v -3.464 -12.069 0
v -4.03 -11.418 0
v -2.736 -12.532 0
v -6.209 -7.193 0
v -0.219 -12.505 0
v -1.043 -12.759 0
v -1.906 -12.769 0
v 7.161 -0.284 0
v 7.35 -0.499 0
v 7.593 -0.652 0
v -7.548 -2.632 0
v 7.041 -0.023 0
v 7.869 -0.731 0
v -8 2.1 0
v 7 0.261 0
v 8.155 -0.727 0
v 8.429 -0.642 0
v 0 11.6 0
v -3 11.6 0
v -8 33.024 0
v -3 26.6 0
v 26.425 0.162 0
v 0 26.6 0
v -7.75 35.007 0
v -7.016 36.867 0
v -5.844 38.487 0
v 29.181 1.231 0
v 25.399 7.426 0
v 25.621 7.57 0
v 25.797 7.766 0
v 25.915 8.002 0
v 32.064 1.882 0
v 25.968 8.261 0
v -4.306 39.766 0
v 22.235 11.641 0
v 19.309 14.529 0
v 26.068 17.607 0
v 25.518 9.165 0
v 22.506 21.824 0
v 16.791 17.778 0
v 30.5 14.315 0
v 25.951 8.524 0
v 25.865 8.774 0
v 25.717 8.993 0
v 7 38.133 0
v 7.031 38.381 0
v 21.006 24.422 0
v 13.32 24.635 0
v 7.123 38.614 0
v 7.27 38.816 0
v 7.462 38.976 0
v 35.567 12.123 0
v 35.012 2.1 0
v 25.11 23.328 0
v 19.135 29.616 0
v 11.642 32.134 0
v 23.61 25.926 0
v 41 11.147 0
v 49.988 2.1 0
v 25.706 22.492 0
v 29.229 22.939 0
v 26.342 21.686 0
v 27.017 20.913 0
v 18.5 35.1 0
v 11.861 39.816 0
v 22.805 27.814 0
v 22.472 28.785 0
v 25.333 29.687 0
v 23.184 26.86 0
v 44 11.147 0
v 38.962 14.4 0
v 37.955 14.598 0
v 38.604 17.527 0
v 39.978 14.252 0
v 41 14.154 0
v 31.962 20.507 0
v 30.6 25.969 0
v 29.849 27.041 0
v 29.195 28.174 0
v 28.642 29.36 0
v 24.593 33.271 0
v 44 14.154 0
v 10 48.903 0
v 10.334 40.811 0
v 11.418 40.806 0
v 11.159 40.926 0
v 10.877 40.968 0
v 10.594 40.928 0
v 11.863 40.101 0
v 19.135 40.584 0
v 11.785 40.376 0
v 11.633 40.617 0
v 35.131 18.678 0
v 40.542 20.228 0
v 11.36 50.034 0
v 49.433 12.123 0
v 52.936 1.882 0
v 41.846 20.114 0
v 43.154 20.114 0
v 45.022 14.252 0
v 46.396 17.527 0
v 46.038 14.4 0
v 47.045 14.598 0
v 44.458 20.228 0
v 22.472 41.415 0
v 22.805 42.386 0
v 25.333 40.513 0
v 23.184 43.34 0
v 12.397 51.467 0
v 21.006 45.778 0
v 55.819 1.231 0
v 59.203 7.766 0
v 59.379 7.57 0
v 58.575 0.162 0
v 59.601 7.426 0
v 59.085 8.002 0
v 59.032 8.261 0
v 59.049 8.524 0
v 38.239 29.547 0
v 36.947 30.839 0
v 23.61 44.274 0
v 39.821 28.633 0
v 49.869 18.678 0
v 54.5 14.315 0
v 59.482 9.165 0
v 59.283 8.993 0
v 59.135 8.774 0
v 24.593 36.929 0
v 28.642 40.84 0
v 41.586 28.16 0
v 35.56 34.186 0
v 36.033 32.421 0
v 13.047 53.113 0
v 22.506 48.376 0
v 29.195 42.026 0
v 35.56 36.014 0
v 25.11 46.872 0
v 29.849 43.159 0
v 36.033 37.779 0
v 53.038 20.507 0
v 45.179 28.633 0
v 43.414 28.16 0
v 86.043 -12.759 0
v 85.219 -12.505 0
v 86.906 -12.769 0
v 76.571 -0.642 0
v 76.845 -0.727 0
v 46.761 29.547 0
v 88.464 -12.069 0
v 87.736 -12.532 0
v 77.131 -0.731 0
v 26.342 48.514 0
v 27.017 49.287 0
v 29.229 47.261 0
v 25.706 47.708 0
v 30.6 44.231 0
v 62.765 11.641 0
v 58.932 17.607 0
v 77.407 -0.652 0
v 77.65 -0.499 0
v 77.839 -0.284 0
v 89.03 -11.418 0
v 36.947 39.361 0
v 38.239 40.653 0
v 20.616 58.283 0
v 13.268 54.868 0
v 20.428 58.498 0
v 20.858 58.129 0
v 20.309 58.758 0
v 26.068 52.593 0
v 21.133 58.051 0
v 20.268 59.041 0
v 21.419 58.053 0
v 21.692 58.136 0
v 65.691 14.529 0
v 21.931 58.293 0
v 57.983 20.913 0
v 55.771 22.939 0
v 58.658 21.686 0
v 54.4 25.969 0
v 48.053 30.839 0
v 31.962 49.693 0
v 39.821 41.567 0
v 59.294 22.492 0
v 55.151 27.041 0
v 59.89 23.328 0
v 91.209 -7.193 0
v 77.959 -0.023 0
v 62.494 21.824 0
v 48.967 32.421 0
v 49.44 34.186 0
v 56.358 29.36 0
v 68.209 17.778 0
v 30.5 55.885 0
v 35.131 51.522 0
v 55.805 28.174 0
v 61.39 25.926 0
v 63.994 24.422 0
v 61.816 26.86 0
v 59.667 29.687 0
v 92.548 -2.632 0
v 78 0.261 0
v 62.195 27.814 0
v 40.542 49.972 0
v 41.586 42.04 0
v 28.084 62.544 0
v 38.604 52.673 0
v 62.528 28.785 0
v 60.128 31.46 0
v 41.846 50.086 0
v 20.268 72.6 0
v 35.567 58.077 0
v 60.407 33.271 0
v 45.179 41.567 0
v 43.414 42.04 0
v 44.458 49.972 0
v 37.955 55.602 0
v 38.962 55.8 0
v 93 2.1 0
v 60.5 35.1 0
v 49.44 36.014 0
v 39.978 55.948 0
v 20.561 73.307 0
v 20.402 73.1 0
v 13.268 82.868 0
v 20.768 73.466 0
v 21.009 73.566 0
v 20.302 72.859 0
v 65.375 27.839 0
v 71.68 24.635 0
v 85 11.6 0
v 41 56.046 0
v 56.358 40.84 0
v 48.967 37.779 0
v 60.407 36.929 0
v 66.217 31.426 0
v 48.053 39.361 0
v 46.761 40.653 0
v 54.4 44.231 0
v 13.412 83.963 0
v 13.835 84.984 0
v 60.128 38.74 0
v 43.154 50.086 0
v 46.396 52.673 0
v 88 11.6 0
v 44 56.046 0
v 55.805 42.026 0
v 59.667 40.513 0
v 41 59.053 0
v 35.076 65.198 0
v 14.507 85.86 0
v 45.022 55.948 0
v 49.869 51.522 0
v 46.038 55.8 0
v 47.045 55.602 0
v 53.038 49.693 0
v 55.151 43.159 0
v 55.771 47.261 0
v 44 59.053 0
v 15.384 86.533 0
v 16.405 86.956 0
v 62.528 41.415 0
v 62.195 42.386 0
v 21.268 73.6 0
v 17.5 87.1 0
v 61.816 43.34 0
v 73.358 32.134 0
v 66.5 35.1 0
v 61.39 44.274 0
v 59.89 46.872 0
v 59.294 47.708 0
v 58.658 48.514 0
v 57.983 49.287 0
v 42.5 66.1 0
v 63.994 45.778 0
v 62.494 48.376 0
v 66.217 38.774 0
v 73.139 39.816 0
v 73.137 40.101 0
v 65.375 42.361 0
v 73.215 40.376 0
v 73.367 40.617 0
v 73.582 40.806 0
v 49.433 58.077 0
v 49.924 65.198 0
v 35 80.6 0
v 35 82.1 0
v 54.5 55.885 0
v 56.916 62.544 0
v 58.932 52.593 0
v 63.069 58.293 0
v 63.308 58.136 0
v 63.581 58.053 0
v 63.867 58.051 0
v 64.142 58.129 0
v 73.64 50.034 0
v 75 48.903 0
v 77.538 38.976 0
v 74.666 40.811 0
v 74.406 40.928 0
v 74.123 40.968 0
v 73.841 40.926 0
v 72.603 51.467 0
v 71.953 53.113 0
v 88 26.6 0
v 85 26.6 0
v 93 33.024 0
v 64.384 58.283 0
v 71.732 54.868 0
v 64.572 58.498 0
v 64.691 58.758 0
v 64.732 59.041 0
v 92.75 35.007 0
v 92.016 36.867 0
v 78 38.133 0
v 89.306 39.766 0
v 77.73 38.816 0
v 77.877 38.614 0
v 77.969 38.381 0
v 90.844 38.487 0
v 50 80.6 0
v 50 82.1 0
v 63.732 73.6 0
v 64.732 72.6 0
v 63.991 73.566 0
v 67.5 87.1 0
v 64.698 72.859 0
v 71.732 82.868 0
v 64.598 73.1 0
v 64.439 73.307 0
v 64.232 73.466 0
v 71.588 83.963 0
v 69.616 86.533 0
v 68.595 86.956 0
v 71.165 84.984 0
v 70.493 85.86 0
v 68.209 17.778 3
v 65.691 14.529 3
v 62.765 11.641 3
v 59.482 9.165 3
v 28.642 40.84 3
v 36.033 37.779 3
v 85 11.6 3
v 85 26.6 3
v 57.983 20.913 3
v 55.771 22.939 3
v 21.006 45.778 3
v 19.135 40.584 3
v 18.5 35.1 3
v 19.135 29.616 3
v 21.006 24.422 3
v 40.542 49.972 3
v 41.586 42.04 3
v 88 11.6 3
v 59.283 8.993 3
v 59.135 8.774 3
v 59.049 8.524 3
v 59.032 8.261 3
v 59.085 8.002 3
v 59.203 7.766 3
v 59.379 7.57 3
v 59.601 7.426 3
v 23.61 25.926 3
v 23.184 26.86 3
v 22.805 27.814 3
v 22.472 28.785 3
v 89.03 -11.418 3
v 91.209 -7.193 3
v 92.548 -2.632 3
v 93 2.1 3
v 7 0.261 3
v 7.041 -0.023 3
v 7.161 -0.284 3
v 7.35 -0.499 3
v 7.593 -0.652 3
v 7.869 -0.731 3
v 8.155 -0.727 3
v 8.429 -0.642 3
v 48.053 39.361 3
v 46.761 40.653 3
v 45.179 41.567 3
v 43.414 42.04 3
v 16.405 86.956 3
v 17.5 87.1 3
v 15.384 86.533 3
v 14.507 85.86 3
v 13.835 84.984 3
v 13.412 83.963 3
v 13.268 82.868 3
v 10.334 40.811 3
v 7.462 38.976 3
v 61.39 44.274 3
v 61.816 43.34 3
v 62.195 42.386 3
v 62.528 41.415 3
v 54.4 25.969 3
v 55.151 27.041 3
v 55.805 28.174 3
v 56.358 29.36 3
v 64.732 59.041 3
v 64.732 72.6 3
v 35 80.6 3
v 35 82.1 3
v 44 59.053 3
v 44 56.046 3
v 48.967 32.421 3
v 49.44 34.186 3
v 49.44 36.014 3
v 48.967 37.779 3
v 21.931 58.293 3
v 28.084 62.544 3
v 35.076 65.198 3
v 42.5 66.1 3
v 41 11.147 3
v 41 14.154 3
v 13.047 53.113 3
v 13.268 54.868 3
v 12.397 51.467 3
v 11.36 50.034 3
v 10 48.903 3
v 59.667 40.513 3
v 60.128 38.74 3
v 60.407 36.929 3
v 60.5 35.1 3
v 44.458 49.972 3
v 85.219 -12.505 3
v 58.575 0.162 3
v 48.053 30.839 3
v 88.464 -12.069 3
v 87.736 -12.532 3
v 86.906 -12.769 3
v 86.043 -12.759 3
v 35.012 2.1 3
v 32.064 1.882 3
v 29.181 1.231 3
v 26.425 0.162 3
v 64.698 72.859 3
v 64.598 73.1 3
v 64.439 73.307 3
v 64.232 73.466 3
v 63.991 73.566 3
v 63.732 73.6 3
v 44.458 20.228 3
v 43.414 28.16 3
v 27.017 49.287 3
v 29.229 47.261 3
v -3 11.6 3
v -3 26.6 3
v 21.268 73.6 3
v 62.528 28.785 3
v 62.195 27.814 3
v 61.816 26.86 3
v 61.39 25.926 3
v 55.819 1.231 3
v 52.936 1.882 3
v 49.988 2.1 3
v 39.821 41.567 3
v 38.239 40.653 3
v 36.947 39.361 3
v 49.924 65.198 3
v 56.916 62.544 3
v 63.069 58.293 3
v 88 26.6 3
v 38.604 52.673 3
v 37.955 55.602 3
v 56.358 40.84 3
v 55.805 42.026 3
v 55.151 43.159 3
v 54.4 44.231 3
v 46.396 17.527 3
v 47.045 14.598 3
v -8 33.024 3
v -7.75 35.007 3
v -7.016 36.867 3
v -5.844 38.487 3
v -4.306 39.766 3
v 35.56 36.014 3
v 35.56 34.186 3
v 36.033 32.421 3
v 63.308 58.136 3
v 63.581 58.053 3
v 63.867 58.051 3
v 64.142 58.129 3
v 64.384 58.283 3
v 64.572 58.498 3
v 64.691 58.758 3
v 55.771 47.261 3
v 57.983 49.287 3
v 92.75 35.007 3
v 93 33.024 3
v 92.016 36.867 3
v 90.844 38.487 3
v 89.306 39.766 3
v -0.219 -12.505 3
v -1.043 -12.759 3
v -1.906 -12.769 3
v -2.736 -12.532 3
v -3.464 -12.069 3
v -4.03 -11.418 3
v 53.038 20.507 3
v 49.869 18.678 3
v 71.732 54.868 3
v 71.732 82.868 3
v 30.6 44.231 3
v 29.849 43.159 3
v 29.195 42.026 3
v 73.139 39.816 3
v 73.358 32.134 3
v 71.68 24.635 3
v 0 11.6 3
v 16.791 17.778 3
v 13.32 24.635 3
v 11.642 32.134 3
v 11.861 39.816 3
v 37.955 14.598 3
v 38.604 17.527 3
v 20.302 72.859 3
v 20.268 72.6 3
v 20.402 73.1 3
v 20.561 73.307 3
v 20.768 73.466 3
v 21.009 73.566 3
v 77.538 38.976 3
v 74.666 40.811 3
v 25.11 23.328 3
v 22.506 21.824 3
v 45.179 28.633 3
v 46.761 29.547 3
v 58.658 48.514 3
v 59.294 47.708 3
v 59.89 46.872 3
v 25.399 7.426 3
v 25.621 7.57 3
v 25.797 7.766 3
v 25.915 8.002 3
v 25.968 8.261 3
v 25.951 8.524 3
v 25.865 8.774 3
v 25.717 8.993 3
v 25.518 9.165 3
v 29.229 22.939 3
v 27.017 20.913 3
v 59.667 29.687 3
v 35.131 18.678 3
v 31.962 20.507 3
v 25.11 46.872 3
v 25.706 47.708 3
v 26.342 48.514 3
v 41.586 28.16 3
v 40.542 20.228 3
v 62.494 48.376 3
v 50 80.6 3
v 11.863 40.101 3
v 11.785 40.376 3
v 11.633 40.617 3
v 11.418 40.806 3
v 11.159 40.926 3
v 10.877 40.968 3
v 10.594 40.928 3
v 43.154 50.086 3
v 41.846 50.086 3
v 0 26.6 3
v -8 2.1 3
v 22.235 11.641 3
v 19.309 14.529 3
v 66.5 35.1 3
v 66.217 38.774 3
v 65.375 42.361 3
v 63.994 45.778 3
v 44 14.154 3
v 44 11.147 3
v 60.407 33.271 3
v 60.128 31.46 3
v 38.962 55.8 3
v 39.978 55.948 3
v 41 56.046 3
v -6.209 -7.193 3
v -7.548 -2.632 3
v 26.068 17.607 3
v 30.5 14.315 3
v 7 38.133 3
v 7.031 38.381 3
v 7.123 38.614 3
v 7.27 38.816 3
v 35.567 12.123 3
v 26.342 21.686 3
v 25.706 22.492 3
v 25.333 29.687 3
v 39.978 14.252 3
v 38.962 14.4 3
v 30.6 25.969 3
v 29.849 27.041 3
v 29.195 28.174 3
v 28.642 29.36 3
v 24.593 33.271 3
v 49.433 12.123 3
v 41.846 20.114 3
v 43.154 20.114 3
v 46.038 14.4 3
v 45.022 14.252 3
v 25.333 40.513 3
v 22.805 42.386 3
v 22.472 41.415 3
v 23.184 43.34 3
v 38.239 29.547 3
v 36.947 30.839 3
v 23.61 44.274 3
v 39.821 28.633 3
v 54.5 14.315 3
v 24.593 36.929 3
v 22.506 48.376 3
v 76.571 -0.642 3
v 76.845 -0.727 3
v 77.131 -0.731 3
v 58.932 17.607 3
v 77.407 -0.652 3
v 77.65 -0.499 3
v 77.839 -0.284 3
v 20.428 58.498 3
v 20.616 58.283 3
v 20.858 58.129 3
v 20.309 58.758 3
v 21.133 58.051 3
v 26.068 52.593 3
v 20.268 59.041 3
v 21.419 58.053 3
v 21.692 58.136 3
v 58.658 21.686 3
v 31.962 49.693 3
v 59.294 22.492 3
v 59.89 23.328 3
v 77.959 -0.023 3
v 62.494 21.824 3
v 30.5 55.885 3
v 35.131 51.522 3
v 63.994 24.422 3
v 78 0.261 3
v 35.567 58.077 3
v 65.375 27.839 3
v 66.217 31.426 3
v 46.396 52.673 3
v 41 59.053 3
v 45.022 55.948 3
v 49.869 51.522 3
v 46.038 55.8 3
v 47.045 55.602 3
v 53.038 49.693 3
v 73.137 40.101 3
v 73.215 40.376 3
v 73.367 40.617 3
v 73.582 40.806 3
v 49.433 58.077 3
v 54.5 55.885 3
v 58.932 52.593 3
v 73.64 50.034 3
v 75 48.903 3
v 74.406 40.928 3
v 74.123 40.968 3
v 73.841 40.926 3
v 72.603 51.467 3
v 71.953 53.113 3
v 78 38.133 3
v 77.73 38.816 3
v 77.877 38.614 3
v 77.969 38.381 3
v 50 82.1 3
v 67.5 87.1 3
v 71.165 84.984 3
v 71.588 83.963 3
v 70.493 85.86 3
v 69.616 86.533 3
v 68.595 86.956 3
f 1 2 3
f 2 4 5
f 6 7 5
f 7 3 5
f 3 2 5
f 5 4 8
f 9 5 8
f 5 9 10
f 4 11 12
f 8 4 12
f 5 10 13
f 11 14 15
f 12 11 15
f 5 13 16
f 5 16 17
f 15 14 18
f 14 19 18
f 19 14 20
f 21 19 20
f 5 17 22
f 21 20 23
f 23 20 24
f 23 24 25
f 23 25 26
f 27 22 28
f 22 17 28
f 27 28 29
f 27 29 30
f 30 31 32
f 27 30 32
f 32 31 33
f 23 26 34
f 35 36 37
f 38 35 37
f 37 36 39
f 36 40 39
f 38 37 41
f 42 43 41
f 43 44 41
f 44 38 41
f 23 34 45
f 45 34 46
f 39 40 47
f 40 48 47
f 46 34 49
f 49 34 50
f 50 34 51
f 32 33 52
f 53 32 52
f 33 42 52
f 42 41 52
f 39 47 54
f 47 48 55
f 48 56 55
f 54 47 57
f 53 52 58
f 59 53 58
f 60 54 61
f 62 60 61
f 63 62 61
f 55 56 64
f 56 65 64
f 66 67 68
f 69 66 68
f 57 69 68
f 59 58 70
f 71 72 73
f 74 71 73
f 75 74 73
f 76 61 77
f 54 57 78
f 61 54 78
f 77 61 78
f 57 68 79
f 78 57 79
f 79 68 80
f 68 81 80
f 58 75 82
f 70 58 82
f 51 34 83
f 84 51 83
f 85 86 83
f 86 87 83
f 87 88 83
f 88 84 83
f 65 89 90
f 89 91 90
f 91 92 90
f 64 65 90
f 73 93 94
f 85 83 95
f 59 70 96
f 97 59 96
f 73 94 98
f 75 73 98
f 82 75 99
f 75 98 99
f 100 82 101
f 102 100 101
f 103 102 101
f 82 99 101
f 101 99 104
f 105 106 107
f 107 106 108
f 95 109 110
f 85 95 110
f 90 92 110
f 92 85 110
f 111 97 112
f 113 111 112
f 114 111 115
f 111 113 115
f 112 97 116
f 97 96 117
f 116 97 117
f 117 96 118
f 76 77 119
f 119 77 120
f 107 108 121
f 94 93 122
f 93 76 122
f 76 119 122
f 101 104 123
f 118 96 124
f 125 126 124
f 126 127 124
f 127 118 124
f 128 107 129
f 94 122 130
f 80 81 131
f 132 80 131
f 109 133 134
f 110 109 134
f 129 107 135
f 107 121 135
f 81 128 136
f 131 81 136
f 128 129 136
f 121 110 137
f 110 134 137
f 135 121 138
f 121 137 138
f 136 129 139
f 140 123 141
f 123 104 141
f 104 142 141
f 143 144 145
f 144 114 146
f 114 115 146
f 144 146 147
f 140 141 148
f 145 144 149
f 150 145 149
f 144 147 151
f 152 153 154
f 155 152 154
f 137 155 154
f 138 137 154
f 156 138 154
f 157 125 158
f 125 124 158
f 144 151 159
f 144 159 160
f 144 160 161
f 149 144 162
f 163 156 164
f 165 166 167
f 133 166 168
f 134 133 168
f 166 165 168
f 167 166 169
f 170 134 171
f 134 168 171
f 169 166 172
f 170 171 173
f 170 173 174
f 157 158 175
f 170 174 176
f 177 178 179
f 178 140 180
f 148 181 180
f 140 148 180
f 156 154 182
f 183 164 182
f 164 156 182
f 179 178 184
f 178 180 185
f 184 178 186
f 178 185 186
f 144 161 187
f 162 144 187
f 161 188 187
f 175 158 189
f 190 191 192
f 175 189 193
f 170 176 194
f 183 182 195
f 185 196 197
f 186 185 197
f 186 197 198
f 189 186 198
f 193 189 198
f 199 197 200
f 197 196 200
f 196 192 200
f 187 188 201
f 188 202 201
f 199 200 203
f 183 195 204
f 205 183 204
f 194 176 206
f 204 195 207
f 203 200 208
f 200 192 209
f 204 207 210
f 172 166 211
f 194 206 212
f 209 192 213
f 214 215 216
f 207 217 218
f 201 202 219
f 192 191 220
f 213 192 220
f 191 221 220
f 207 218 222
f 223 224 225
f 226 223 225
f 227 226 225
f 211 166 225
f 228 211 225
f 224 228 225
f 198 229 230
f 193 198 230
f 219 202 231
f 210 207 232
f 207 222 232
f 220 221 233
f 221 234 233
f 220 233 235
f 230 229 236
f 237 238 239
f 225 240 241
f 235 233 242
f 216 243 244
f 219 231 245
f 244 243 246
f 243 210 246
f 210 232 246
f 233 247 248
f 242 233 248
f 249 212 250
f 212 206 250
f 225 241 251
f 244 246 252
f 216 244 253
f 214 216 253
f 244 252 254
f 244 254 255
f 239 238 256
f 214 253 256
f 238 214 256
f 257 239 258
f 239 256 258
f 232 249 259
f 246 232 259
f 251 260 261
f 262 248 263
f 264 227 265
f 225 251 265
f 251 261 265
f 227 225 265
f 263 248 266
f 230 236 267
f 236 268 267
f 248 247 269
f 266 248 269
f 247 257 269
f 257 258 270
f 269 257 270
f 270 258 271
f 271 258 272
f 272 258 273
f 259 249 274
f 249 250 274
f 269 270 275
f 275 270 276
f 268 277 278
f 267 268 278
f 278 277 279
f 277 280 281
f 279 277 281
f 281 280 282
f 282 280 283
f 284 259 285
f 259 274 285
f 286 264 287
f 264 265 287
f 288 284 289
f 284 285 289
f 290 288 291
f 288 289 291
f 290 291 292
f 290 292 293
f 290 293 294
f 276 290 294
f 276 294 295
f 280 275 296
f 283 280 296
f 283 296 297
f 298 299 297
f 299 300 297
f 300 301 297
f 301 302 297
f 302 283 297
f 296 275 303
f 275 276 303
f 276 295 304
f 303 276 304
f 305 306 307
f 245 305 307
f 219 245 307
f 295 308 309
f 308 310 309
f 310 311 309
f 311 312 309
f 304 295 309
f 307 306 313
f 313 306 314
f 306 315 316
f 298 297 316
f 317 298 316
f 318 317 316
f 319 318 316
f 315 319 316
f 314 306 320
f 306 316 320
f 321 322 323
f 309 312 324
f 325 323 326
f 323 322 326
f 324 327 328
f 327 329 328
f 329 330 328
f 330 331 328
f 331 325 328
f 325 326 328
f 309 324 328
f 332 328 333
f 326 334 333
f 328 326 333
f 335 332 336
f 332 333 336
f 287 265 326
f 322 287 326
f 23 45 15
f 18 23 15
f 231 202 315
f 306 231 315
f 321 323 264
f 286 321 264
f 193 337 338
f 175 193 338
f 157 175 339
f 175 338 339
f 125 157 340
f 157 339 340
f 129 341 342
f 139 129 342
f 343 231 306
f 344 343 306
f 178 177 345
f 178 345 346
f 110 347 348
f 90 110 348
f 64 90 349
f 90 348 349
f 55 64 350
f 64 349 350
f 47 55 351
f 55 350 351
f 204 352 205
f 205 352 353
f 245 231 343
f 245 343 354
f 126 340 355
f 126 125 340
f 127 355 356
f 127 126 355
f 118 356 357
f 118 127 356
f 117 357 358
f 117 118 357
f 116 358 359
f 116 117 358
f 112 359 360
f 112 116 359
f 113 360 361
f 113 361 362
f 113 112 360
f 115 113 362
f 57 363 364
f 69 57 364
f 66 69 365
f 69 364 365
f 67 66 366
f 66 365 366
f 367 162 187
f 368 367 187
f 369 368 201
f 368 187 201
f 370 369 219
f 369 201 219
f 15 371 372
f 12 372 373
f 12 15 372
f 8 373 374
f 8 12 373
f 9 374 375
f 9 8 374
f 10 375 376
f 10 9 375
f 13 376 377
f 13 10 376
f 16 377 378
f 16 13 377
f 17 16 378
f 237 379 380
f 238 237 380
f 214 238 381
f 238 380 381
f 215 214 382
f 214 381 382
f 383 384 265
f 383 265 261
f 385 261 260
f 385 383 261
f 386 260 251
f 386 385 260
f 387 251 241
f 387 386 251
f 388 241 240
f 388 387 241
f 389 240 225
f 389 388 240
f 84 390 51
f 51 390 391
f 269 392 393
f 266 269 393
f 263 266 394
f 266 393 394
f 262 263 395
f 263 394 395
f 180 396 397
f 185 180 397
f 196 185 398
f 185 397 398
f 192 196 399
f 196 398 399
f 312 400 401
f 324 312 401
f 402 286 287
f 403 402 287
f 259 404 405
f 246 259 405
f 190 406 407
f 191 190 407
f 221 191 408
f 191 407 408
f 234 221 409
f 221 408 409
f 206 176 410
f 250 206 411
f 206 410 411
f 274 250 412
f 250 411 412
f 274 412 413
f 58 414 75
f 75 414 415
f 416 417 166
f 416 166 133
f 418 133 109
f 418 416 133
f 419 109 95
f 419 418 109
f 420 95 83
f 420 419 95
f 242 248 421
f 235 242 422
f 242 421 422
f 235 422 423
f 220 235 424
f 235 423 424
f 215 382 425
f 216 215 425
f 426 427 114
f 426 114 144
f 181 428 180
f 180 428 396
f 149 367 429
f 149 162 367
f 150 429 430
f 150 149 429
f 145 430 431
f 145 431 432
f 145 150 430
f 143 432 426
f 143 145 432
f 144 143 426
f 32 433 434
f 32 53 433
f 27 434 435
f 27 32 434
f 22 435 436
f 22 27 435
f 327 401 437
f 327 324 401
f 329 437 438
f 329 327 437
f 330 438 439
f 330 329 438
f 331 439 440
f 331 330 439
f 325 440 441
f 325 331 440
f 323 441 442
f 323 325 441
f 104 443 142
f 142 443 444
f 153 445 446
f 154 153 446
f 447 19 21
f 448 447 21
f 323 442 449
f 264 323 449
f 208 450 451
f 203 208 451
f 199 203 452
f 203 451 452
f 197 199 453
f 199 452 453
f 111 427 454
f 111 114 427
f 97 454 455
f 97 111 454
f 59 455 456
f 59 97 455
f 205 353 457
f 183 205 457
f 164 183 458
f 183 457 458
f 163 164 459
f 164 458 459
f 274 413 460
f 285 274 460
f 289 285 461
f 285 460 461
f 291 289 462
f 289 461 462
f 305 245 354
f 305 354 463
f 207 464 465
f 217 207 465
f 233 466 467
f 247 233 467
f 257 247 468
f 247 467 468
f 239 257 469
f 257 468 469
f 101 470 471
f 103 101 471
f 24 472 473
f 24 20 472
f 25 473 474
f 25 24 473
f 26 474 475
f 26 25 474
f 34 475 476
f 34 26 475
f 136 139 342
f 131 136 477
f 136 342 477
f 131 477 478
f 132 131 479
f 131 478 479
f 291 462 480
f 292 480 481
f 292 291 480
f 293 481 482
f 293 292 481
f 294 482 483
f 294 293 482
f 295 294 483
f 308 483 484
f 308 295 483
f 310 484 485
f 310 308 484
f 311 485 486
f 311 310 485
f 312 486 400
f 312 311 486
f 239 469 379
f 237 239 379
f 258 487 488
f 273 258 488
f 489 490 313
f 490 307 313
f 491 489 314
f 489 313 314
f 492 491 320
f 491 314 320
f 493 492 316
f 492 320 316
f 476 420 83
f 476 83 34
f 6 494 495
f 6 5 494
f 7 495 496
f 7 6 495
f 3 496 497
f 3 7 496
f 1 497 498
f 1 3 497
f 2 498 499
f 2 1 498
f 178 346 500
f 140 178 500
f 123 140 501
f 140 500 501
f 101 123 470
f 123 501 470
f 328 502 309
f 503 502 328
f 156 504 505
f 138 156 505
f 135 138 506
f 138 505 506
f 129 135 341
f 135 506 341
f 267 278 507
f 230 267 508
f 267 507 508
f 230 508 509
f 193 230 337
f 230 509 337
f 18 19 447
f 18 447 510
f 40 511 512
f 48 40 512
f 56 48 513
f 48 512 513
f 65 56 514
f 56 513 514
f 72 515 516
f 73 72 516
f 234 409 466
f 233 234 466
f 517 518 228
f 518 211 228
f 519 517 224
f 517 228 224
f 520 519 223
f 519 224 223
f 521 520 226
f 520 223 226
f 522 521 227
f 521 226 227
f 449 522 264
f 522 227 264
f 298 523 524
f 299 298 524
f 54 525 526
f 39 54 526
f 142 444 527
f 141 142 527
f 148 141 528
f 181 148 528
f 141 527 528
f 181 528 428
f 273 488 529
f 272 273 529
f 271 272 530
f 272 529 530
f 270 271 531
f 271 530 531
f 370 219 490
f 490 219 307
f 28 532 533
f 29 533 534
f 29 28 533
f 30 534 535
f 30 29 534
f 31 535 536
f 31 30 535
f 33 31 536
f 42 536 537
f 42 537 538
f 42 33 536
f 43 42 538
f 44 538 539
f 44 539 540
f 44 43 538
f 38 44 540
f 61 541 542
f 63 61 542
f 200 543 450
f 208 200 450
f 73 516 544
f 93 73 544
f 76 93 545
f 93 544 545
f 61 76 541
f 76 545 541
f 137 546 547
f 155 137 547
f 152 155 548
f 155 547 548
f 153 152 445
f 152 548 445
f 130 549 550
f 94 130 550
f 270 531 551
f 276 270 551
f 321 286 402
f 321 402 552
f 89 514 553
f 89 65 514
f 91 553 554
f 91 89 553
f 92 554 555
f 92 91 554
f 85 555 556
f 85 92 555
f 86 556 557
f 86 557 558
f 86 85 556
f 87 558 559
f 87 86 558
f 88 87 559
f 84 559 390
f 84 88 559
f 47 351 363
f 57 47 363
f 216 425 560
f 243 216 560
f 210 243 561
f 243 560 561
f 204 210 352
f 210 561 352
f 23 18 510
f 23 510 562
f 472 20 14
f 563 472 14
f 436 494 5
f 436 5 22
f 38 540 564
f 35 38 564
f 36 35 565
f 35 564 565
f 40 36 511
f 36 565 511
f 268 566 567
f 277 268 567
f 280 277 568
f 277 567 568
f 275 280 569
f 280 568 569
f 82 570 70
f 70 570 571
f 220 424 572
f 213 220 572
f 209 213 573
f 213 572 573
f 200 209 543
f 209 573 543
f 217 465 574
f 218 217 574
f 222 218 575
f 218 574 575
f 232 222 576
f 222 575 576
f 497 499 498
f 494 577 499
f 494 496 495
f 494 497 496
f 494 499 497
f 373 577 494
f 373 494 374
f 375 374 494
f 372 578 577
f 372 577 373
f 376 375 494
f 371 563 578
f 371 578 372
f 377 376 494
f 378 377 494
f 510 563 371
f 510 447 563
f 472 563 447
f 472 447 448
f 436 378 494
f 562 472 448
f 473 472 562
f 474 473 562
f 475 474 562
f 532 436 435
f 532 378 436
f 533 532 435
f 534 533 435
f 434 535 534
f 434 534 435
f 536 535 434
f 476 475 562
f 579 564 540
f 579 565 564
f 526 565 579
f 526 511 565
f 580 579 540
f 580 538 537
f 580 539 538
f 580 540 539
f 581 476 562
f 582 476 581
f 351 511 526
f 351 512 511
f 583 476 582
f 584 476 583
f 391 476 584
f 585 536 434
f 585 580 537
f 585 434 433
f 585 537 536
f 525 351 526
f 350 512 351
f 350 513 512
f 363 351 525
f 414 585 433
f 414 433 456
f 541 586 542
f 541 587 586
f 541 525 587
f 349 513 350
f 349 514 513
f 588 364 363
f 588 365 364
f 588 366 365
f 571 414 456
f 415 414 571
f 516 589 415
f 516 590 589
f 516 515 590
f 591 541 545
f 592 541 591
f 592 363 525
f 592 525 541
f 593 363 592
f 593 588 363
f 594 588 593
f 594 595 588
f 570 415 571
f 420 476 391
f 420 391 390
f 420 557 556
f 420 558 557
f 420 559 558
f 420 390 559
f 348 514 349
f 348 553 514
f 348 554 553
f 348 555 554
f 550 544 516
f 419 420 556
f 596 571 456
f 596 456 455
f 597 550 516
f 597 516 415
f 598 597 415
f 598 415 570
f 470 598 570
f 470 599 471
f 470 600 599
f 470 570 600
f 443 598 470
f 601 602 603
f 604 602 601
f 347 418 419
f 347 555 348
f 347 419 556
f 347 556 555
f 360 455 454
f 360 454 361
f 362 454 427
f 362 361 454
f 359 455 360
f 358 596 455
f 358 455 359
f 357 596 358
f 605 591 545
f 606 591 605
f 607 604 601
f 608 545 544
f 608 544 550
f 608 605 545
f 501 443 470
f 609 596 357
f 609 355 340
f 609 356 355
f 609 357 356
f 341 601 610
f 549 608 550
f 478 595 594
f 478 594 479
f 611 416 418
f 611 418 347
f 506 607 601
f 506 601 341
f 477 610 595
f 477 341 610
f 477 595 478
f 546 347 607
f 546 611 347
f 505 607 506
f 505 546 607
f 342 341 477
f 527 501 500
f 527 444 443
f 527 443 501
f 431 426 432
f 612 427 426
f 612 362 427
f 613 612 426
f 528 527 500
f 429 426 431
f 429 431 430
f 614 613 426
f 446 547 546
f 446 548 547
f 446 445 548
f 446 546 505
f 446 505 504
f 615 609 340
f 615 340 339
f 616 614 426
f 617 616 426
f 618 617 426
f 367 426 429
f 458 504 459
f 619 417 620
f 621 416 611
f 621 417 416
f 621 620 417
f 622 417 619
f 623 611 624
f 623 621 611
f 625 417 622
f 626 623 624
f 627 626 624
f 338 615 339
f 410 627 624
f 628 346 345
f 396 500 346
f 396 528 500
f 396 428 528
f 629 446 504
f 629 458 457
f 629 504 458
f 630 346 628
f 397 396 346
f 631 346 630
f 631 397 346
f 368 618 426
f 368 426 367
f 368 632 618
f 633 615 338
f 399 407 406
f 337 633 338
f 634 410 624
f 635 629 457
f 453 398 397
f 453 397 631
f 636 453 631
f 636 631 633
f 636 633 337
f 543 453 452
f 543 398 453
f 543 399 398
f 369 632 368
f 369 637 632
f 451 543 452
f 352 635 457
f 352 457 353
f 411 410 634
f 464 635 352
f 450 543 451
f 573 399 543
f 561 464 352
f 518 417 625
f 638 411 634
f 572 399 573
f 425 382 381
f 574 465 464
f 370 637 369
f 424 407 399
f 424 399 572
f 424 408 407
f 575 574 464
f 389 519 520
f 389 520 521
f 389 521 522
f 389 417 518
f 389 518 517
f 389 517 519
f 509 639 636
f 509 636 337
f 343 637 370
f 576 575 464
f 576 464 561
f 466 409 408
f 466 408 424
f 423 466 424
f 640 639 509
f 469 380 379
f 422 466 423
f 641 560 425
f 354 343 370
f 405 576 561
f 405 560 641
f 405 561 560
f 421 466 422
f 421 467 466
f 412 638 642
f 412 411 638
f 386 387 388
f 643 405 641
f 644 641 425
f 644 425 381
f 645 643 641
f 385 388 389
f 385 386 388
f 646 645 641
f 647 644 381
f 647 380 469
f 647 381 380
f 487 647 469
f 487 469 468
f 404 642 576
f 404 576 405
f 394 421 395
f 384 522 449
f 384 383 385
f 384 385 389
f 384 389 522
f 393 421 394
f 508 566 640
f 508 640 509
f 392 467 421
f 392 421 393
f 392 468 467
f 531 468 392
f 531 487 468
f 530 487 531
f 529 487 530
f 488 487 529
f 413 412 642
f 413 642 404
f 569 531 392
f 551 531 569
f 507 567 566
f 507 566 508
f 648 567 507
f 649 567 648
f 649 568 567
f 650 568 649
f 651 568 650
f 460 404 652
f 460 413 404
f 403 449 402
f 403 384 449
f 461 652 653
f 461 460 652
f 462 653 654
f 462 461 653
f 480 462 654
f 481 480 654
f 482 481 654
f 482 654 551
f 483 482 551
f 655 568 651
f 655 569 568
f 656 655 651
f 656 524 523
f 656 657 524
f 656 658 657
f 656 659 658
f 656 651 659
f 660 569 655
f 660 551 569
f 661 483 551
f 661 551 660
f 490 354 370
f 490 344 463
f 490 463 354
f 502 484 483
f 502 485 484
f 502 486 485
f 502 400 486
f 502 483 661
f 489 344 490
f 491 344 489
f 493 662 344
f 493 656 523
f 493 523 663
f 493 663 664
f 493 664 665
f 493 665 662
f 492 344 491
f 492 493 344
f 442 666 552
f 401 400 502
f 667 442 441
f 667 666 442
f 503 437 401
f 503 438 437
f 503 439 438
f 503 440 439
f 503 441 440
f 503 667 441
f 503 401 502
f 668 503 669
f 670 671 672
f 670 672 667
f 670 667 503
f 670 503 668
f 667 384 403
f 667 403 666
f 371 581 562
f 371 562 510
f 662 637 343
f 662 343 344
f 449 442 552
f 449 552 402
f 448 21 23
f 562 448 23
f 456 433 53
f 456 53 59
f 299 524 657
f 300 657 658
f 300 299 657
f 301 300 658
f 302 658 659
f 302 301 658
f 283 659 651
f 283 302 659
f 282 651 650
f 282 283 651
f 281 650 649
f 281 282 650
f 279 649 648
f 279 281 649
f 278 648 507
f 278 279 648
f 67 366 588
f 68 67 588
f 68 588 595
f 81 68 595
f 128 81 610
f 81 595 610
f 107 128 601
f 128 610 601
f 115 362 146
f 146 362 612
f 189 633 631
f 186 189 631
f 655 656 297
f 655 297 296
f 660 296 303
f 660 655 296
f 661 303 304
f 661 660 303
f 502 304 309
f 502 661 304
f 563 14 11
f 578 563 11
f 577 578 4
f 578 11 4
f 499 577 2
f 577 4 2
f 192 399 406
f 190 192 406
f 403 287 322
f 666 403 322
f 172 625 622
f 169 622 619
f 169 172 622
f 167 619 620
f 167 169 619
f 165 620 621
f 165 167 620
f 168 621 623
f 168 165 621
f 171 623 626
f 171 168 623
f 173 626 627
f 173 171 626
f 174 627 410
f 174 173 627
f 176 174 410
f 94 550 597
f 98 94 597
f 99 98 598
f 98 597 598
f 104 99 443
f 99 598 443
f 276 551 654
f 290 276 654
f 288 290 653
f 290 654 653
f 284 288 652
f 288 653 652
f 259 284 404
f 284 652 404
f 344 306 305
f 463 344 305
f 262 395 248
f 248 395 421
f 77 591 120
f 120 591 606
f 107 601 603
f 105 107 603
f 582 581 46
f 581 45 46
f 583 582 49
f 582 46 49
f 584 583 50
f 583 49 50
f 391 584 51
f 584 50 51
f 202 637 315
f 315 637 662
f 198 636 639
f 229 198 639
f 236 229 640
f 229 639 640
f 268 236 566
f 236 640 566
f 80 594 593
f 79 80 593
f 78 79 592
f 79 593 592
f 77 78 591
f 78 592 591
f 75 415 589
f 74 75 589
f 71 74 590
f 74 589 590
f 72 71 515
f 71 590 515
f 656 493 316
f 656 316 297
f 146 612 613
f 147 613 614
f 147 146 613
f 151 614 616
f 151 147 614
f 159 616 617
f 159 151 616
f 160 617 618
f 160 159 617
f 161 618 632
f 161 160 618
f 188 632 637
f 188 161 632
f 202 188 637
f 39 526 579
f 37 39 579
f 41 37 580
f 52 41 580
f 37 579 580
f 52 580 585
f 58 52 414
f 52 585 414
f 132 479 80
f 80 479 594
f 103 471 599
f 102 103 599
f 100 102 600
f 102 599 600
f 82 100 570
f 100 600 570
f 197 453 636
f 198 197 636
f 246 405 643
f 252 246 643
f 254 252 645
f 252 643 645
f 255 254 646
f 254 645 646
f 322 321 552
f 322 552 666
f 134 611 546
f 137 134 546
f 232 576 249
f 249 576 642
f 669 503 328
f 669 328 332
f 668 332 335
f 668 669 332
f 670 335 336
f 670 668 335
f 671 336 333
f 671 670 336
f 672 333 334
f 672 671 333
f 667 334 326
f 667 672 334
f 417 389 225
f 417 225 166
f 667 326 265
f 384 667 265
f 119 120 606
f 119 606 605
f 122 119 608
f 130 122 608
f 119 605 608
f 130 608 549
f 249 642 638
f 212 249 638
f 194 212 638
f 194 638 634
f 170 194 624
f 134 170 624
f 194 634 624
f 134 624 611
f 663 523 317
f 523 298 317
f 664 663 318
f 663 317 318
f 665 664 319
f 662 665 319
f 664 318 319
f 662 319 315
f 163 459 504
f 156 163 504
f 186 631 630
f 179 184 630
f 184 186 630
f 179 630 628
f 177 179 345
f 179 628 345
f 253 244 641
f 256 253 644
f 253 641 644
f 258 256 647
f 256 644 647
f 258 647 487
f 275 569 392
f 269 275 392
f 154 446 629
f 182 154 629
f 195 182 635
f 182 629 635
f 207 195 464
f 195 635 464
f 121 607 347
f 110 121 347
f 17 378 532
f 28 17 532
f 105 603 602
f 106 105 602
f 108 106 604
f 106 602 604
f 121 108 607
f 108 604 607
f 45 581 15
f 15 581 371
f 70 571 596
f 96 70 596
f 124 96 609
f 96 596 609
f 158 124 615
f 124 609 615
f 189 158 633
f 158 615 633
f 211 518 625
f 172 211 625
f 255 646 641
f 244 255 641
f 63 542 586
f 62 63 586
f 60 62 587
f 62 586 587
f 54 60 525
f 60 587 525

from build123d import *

# Parameters (mm, degrees)
SKETCH2_W           = 3
SKETCH2_H           = 15
SKETCH2_W_2         = 15
SKETCH2_H_2         = 1.5
BOSS_EXTRUDE1_DEPTH = 3
CUT_EXTRUDE1_DEPTH  = 128.45356017
FILLET1_R           = 3
FILLET2_R           = 20
FILLET3_R           = 8
SKETCH5_R           = 7
CUT_EXTRUDE2_DEPTH  = 128.45356017
CUT_EXTRUDE3_DEPTH  = 128.45356017
FILLET4_R           = 1


with BuildPart() as part:
    # Sketch2 → Boss-Extrude1 (new body)
    with BuildSketch(Plane.XY):
        with BuildLine():
            Line((93, 2.1), (93, 62.1))
            ThreePointArc((93, 62.1), (85.67766953, 79.77766953), (68, 87.1))
            Line((68, 87.1), (17, 87.1))
            ThreePointArc((17, 87.1), (-0.67766953, 79.77766953), (-8, 62.1))
            Line((-8, 62.1), (-8, 2.1))
            ThreePointArc((-8, 2.1), (-0.67766953, -15.57766953), (17, -22.9))
            Line((17, -22.9), (68, -22.9))
            ThreePointArc((68, -22.9), (85.67766953, -15.57766953), (93, 2.1))
        make_face()
        with Locations((-1.5, 19.1)):
            Rectangle(SKETCH2_W, SKETCH2_H, mode=Mode.SUBTRACT)
        with Locations((86.5, 19.1)):
            Rectangle(SKETCH2_W, SKETCH2_H, mode=Mode.SUBTRACT)
        with Locations((42.5, 81.35)):
            Rectangle(SKETCH2_W_2, SKETCH2_H_2, mode=Mode.SUBTRACT)
    extrude(amount=BOSS_EXTRUDE1_DEPTH)

    # Sketch3 → Cut-Extrude1 (cut, through all)
    with BuildSketch(Plane.XY.offset(3)):
        with BuildLine():
            Line((13.267805899, 82.867805899), (13.267805899, 54.867805899))
            ThreePointArc((13.267805899, 54.867805899), (12.397322327, 51.467236981), (10, 48.903166724))
            Line((10, 48.903166724), (-8, 37.406474337))
            Line((-8, 37.406474337), (-8, 106.022950617))
            Line((-8, 106.022950617), (93, 106.022950617))
            Line((93, 106.022950617), (93, 37.406474337))
            Line((93, 37.406474337), (75, 48.903166724))
            ThreePointArc((75, 48.903166724), (72.602677673, 51.467236981), (71.732194101, 54.867805899))
            Line((71.732194101, 54.867805899), (71.732194101, 82.867805899))
            ThreePointArc((71.732194101, 82.867805899), (70.492613148, 85.860419047), (67.5, 87.1))
            Line((67.5, 87.1), (17.5, 87.1))
            ThreePointArc((17.5, 87.1), (14.507386852, 85.860419047), (13.267805899, 82.867805899))
        make_face()
        Polygon((-2.473837178, -13.577042628), (30.5, 2.1), (54.5, 2.1), (87.473837178, -13.577042628), (87.473837178, -35.532818411), (-2.473837178, -35.532818411), align=None)
    extrude(amount=-CUT_EXTRUDE1_DEPTH, mode=Mode.SUBTRACT)

    # Fillet1
    fillet1_edges = [part.edges().sort_by_distance(p)[0] for p in [
        (-2.473837178, -13.577042628, 1.5),
        (87.473837178, -13.577042628, 1.5),
    ]]
    fillet(fillet1_edges, radius=FILLET1_R)

    # Fillet2
    fillet2_edges = [part.edges().sort_by_distance(p)[0] for p in [
        (30.5, 2.1, 1.5),
        (54.5, 2.1, 1.5),
    ]]
    fillet(fillet2_edges, radius=FILLET2_R)

    # Fillet3
    fillet3_edges = [part.edges().sort_by_distance(p)[0] for p in [
        (-8, 37.406474337, 1.5),
        (93, 37.406474337, 1.5),
    ]]
    fillet(fillet3_edges, radius=FILLET3_R)

    # Sketch5 → Cut-Extrude2 (cut, through all)
    with BuildSketch(Plane.XY.offset(3)):
        with BuildLine():
            Line((41, 56.046360066), (41, 59.053079134))
            ThreePointArc((41, 59.053079134), (30.5, 55.884609691), (22.506024971, 48.375577673))
            Line((22.506024971, 48.375577673), (25.109920066, 46.872218139))
            ThreePointArc((25.109920066, 46.872218139), (26.019246877, 48.114790682), (27.017175927, 49.28739436))
            ThreePointArc((27.017175927, 49.28739436), (32, 53.286533479), (37.954768107, 55.60221615))
            ThreePointArc((37.954768107, 55.60221615), (39.469237206, 55.880146219), (41, 56.046360066))
        make_face()
        with BuildLine():
            Line((23.609920066, 44.274141927), (21.006024971, 45.777501461))
            ThreePointArc((21.006024971, 45.777501461), (18.5, 35.1), (21.006024971, 24.422498539))
            Line((21.006024971, 24.422498539), (23.609920066, 25.925858073))
            ThreePointArc((23.609920066, 25.925858073), (22.988484083, 27.334644463), (22.471944034, 28.78517821))
            ThreePointArc((22.471944034, 28.78517821), (21.5, 35.1), (22.471944034, 41.41482179))
            ThreePointArc((22.471944034, 41.41482179), (22.988484083, 42.865355537), (23.609920066, 44.274141927))
        make_face()
        with BuildLine():
            Line((25.109920066, 23.327781861), (22.506024971, 21.824422327))
            ThreePointArc((22.506024971, 21.824422327), (30.5, 14.315390309), (41, 11.146920866))
            Line((41, 11.146920866), (41, 14.153639934))
            ThreePointArc((41, 14.153639934), (39.469237206, 14.319853781), (37.954768107, 14.59778385))
            ThreePointArc((37.954768107, 14.59778385), (32, 16.913466521), (27.017175927, 20.91260564))
            ThreePointArc((27.017175927, 20.91260564), (26.019246877, 22.085209318), (25.109920066, 23.327781861))
        make_face()
        with BuildLine():
            ThreePointArc((44, 11.146920866), (54.5, 14.315390309), (62.493975029, 21.824422327))
            Line((62.493975029, 21.824422327), (59.890079934, 23.327781861))
            ThreePointArc((59.890079934, 23.327781861), (58.980753123, 22.085209318), (57.982824073, 20.91260564))
            ThreePointArc((57.982824073, 20.91260564), (53, 16.913466521), (47.045231893, 14.59778385))
            ThreePointArc((47.045231893, 14.59778385), (45.530762794, 14.319853781), (44, 14.153639934))
            Line((44, 14.153639934), (44, 11.146920866))
        make_face()
        with BuildLine():
            ThreePointArc((66.5, 35.1), (65.86509577, 40.583821628), (63.993975029, 45.777501461))
            Line((63.993975029, 45.777501461), (61.390079934, 44.274141927))
            ThreePointArc((61.390079934, 44.274141927), (62.011515917, 42.865355537), (62.528055966, 41.41482179))
            ThreePointArc((62.528055966, 41.41482179), (63.25559172, 38.29459111), (63.5, 35.1))
            ThreePointArc((63.5, 35.1), (63.25559172, 31.90540889), (62.528055966, 28.78517821))
            ThreePointArc((62.528055966, 28.78517821), (62.011515917, 27.334644463), (61.390079934, 25.925858073))
            Line((61.390079934, 25.925858073), (63.993975029, 24.422498539))
            ThreePointArc((63.993975029, 24.422498539), (65.86509577, 29.616178372), (66.5, 35.1))
        make_face()
        with BuildLine():
            ThreePointArc((62.493975029, 48.375577673), (54.5, 55.884609691), (44, 59.053079134))
            Line((44, 59.053079134), (44, 56.046360066))
            ThreePointArc((44, 56.046360066), (45.530762794, 55.880146219), (47.045231893, 55.60221615))
            ThreePointArc((47.045231893, 55.60221615), (53, 53.286533479), (57.982824073, 49.28739436))
            ThreePointArc((57.982824073, 49.28739436), (58.980753123, 48.114790682), (59.890079934, 46.872218139))
            Line((59.890079934, 46.872218139), (62.493975029, 48.375577673))
        make_face()
        with BuildLine():
            Line((38.604086949, 52.673328128), (37.954768107, 55.60221615))
            ThreePointArc((37.954768107, 55.60221615), (32, 53.286533479), (27.017175927, 49.28739436))
            Line((27.017175927, 49.28739436), (29.229007937, 47.260623737))
            ThreePointArc((29.229007937, 47.260623737), (33.5, 50.688457268), (38.604086949, 52.673328128))
        make_face()
        with BuildLine():
            Line((25.333094887, 40.512704391), (22.471944034, 41.41482179))
            ThreePointArc((22.471944034, 41.41482179), (21.5, 35.1), (22.471944034, 28.78517821))
            Line((22.471944034, 28.78517821), (25.333094887, 29.687295609))
            ThreePointArc((25.333094887, 29.687295609), (24.5, 35.1), (25.333094887, 40.512704391))
        make_face()
        with BuildLine():
            Line((29.229007937, 22.939376263), (27.017175927, 20.91260564))
            ThreePointArc((27.017175927, 20.91260564), (32, 16.913466521), (37.954768107, 14.59778385))
            Line((37.954768107, 14.59778385), (38.604086949, 17.526671872))
            ThreePointArc((38.604086949, 17.526671872), (33.5, 19.511542732), (29.229007937, 22.939376263))
        make_face()
        with BuildLine():
            ThreePointArc((47.045231893, 14.59778385), (53, 16.913466521), (57.982824073, 20.91260564))
            Line((57.982824073, 20.91260564), (55.770992063, 22.939376263))
            ThreePointArc((55.770992063, 22.939376263), (51.5, 19.511542732), (46.395913051, 17.526671872))
            Line((46.395913051, 17.526671872), (47.045231893, 14.59778385))
        make_face()
        with BuildLine():
            ThreePointArc((63.5, 35.1), (63.25559172, 38.29459111), (62.528055966, 41.41482179))
            Line((62.528055966, 41.41482179), (59.666905113, 40.512704391))
            ThreePointArc((59.666905113, 40.512704391), (60.290507188, 37.838220951), (60.5, 35.1))
            ThreePointArc((60.5, 35.1), (60.290507188, 32.361779049), (59.666905113, 29.687295609))
            Line((59.666905113, 29.687295609), (62.528055966, 28.78517821))
            ThreePointArc((62.528055966, 28.78517821), (63.25559172, 31.90540889), (63.5, 35.1))
        make_face()
        with BuildLine():
            ThreePointArc((57.982824073, 49.28739436), (53, 53.286533479), (47.045231893, 55.60221615))
            Line((47.045231893, 55.60221615), (46.395913051, 52.673328128))
            ThreePointArc((46.395913051, 52.673328128), (51.5, 50.688457268), (55.770992063, 47.260623737))
            Line((55.770992063, 47.260623737), (57.982824073, 49.28739436))
        make_face()
        with BuildLine():
            Line((36.946526618, 39.361330003), (30.599699896, 44.231421435))
            ThreePointArc((30.599699896, 44.231421435), (29.509618943, 42.6), (28.641807012, 40.840251485))
            Line((28.641807012, 40.840251485), (36.032843272, 37.778784027))
            ThreePointArc((36.032843272, 37.778784027), (36.437822174, 38.6), (36.946526618, 39.361330003))
        make_face()
        with BuildLine():
            Line((36.032843272, 32.421215973), (28.641807012, 29.359748515))
            ThreePointArc((28.641807012, 29.359748515), (29.509618943, 27.6), (30.599699896, 25.968578565))
            Line((30.599699896, 25.968578565), (36.946526618, 30.838669997))
            ThreePointArc((36.946526618, 30.838669997), (36.437822174, 31.6), (36.032843272, 32.421215973))
        make_face()
        with BuildLine():
            ThreePointArc((56.358192988, 40.840251485), (55.490381057, 42.6), (54.400300104, 44.231421435))
            Line((54.400300104, 44.231421435), (48.053473382, 39.361330003))
            ThreePointArc((48.053473382, 39.361330003), (48.562177826, 38.6), (48.967156728, 37.778784027))
            Line((48.967156728, 37.778784027), (56.358192988, 40.840251485))
        make_face()
        with BuildLine():
            ThreePointArc((54.400300104, 25.968578565), (55.490381057, 27.6), (56.358192988, 29.359748515))
            Line((56.358192988, 29.359748515), (48.967156728, 32.421215973))
            ThreePointArc((48.967156728, 32.421215973), (48.562177826, 31.6), (48.053473382, 30.838669997))
            Line((48.053473382, 30.838669997), (54.400300104, 25.968578565))
        make_face()
        with BuildLine():
            ThreePointArc((40.542107117, 20.228327079), (42.5, 20.1), (44.457892883, 20.228327079))
            Line((44.457892883, 20.228327079), (43.413683346, 28.15988597))
            ThreePointArc((43.413683346, 28.15988597), (42.5, 28.1), (41.586316654, 28.15988597))
            Line((41.586316654, 28.15988597), (40.542107117, 20.228327079))
        make_face()
        with BuildLine():
            Line((43.413683346, 42.04011403), (44.457892883, 49.971672921))
            ThreePointArc((44.457892883, 49.971672921), (42.5, 50.1), (40.542107117, 49.971672921))
            Line((40.542107117, 49.971672921), (41.586316654, 42.04011403))
            ThreePointArc((41.586316654, 42.04011403), (42.5, 42.1), (43.413683346, 42.04011403))
        make_face()
        with Locations((42.5, 35.1)):
            Circle(SKETCH5_R)
    extrude(amount=-CUT_EXTRUDE2_DEPTH, mode=Mode.SUBTRACT)

    # Sketch6 → Cut-Extrude3 (cut, through all)
    with BuildSketch(Plane.XY.offset(3)):
        with BuildLine():
            Line((20.267805899, 73.6), (20.267805899, 56.703924307))
            ThreePointArc((20.267805899, 56.703924307), (30.43189438, 63.654523753), (42.5, 66.1))
            ThreePointArc((42.5, 66.1), (54.56810562, 63.654523753), (64.732194101, 56.703924307))
            Line((64.732194101, 56.703924307), (64.732194101, 73.6))
            Line((64.732194101, 73.6), (20.267805899, 73.6))
        make_face()
        with BuildLine():
            Line((7, 38.681073475), (7, -1.321937625))
            Line((7, -1.321937625), (27.063139268, 8.216857871))
            ThreePointArc((27.063139268, 8.216857871), (21.378843495, 12.408663594), (16.790879782, 17.778304424))
            ThreePointArc((16.790879782, 17.778304424), (12.018818863, 29.452204281), (12.291615553, 42.060855488))
            Line((12.291615553, 42.060855488), (7, 38.681073475))
        make_face()
        with BuildLine():
            Line((78, 38.681073475), (72.708384447, 42.060855488))
            ThreePointArc((72.708384447, 42.060855488), (72.981181137, 29.452204281), (68.209120218, 17.778304424))
            ThreePointArc((68.209120218, 17.778304424), (63.621156505, 12.408663594), (57.936860732, 8.216857871))
            Line((57.936860732, 8.216857871), (78, -1.321937625))
            Line((78, -1.321937625), (78, 38.681073475))
        make_face()
    extrude(amount=-CUT_EXTRUDE3_DEPTH, mode=Mode.SUBTRACT)

    # Fillet4
    fillet4_edges = [part.edges().sort_by_distance(p)[0] for p in [
        (20.267805899, 73.6, 1.5),
        (64.732194101, 73.6, 1.5),
        (64.732194101, 56.703924307, 1.5),
        (20.267805899, 56.703924307, 1.5),
        (7, 38.681073475, 1.5),
        (12.291615553, 42.060855488, 1.5),
        (27.063139268, 8.216857871, 1.5),
        (7, -1.321937625, 1.5),
        (72.708384447, 42.060855488, 1.5),
        (78, 38.681073475, 1.5),
        (78, -1.321937625, 1.5),
        (57.936860732, 8.216857871, 1.5),
    ]]
    fillet(fillet4_edges, radius=FILLET4_R)


solid = part.part
